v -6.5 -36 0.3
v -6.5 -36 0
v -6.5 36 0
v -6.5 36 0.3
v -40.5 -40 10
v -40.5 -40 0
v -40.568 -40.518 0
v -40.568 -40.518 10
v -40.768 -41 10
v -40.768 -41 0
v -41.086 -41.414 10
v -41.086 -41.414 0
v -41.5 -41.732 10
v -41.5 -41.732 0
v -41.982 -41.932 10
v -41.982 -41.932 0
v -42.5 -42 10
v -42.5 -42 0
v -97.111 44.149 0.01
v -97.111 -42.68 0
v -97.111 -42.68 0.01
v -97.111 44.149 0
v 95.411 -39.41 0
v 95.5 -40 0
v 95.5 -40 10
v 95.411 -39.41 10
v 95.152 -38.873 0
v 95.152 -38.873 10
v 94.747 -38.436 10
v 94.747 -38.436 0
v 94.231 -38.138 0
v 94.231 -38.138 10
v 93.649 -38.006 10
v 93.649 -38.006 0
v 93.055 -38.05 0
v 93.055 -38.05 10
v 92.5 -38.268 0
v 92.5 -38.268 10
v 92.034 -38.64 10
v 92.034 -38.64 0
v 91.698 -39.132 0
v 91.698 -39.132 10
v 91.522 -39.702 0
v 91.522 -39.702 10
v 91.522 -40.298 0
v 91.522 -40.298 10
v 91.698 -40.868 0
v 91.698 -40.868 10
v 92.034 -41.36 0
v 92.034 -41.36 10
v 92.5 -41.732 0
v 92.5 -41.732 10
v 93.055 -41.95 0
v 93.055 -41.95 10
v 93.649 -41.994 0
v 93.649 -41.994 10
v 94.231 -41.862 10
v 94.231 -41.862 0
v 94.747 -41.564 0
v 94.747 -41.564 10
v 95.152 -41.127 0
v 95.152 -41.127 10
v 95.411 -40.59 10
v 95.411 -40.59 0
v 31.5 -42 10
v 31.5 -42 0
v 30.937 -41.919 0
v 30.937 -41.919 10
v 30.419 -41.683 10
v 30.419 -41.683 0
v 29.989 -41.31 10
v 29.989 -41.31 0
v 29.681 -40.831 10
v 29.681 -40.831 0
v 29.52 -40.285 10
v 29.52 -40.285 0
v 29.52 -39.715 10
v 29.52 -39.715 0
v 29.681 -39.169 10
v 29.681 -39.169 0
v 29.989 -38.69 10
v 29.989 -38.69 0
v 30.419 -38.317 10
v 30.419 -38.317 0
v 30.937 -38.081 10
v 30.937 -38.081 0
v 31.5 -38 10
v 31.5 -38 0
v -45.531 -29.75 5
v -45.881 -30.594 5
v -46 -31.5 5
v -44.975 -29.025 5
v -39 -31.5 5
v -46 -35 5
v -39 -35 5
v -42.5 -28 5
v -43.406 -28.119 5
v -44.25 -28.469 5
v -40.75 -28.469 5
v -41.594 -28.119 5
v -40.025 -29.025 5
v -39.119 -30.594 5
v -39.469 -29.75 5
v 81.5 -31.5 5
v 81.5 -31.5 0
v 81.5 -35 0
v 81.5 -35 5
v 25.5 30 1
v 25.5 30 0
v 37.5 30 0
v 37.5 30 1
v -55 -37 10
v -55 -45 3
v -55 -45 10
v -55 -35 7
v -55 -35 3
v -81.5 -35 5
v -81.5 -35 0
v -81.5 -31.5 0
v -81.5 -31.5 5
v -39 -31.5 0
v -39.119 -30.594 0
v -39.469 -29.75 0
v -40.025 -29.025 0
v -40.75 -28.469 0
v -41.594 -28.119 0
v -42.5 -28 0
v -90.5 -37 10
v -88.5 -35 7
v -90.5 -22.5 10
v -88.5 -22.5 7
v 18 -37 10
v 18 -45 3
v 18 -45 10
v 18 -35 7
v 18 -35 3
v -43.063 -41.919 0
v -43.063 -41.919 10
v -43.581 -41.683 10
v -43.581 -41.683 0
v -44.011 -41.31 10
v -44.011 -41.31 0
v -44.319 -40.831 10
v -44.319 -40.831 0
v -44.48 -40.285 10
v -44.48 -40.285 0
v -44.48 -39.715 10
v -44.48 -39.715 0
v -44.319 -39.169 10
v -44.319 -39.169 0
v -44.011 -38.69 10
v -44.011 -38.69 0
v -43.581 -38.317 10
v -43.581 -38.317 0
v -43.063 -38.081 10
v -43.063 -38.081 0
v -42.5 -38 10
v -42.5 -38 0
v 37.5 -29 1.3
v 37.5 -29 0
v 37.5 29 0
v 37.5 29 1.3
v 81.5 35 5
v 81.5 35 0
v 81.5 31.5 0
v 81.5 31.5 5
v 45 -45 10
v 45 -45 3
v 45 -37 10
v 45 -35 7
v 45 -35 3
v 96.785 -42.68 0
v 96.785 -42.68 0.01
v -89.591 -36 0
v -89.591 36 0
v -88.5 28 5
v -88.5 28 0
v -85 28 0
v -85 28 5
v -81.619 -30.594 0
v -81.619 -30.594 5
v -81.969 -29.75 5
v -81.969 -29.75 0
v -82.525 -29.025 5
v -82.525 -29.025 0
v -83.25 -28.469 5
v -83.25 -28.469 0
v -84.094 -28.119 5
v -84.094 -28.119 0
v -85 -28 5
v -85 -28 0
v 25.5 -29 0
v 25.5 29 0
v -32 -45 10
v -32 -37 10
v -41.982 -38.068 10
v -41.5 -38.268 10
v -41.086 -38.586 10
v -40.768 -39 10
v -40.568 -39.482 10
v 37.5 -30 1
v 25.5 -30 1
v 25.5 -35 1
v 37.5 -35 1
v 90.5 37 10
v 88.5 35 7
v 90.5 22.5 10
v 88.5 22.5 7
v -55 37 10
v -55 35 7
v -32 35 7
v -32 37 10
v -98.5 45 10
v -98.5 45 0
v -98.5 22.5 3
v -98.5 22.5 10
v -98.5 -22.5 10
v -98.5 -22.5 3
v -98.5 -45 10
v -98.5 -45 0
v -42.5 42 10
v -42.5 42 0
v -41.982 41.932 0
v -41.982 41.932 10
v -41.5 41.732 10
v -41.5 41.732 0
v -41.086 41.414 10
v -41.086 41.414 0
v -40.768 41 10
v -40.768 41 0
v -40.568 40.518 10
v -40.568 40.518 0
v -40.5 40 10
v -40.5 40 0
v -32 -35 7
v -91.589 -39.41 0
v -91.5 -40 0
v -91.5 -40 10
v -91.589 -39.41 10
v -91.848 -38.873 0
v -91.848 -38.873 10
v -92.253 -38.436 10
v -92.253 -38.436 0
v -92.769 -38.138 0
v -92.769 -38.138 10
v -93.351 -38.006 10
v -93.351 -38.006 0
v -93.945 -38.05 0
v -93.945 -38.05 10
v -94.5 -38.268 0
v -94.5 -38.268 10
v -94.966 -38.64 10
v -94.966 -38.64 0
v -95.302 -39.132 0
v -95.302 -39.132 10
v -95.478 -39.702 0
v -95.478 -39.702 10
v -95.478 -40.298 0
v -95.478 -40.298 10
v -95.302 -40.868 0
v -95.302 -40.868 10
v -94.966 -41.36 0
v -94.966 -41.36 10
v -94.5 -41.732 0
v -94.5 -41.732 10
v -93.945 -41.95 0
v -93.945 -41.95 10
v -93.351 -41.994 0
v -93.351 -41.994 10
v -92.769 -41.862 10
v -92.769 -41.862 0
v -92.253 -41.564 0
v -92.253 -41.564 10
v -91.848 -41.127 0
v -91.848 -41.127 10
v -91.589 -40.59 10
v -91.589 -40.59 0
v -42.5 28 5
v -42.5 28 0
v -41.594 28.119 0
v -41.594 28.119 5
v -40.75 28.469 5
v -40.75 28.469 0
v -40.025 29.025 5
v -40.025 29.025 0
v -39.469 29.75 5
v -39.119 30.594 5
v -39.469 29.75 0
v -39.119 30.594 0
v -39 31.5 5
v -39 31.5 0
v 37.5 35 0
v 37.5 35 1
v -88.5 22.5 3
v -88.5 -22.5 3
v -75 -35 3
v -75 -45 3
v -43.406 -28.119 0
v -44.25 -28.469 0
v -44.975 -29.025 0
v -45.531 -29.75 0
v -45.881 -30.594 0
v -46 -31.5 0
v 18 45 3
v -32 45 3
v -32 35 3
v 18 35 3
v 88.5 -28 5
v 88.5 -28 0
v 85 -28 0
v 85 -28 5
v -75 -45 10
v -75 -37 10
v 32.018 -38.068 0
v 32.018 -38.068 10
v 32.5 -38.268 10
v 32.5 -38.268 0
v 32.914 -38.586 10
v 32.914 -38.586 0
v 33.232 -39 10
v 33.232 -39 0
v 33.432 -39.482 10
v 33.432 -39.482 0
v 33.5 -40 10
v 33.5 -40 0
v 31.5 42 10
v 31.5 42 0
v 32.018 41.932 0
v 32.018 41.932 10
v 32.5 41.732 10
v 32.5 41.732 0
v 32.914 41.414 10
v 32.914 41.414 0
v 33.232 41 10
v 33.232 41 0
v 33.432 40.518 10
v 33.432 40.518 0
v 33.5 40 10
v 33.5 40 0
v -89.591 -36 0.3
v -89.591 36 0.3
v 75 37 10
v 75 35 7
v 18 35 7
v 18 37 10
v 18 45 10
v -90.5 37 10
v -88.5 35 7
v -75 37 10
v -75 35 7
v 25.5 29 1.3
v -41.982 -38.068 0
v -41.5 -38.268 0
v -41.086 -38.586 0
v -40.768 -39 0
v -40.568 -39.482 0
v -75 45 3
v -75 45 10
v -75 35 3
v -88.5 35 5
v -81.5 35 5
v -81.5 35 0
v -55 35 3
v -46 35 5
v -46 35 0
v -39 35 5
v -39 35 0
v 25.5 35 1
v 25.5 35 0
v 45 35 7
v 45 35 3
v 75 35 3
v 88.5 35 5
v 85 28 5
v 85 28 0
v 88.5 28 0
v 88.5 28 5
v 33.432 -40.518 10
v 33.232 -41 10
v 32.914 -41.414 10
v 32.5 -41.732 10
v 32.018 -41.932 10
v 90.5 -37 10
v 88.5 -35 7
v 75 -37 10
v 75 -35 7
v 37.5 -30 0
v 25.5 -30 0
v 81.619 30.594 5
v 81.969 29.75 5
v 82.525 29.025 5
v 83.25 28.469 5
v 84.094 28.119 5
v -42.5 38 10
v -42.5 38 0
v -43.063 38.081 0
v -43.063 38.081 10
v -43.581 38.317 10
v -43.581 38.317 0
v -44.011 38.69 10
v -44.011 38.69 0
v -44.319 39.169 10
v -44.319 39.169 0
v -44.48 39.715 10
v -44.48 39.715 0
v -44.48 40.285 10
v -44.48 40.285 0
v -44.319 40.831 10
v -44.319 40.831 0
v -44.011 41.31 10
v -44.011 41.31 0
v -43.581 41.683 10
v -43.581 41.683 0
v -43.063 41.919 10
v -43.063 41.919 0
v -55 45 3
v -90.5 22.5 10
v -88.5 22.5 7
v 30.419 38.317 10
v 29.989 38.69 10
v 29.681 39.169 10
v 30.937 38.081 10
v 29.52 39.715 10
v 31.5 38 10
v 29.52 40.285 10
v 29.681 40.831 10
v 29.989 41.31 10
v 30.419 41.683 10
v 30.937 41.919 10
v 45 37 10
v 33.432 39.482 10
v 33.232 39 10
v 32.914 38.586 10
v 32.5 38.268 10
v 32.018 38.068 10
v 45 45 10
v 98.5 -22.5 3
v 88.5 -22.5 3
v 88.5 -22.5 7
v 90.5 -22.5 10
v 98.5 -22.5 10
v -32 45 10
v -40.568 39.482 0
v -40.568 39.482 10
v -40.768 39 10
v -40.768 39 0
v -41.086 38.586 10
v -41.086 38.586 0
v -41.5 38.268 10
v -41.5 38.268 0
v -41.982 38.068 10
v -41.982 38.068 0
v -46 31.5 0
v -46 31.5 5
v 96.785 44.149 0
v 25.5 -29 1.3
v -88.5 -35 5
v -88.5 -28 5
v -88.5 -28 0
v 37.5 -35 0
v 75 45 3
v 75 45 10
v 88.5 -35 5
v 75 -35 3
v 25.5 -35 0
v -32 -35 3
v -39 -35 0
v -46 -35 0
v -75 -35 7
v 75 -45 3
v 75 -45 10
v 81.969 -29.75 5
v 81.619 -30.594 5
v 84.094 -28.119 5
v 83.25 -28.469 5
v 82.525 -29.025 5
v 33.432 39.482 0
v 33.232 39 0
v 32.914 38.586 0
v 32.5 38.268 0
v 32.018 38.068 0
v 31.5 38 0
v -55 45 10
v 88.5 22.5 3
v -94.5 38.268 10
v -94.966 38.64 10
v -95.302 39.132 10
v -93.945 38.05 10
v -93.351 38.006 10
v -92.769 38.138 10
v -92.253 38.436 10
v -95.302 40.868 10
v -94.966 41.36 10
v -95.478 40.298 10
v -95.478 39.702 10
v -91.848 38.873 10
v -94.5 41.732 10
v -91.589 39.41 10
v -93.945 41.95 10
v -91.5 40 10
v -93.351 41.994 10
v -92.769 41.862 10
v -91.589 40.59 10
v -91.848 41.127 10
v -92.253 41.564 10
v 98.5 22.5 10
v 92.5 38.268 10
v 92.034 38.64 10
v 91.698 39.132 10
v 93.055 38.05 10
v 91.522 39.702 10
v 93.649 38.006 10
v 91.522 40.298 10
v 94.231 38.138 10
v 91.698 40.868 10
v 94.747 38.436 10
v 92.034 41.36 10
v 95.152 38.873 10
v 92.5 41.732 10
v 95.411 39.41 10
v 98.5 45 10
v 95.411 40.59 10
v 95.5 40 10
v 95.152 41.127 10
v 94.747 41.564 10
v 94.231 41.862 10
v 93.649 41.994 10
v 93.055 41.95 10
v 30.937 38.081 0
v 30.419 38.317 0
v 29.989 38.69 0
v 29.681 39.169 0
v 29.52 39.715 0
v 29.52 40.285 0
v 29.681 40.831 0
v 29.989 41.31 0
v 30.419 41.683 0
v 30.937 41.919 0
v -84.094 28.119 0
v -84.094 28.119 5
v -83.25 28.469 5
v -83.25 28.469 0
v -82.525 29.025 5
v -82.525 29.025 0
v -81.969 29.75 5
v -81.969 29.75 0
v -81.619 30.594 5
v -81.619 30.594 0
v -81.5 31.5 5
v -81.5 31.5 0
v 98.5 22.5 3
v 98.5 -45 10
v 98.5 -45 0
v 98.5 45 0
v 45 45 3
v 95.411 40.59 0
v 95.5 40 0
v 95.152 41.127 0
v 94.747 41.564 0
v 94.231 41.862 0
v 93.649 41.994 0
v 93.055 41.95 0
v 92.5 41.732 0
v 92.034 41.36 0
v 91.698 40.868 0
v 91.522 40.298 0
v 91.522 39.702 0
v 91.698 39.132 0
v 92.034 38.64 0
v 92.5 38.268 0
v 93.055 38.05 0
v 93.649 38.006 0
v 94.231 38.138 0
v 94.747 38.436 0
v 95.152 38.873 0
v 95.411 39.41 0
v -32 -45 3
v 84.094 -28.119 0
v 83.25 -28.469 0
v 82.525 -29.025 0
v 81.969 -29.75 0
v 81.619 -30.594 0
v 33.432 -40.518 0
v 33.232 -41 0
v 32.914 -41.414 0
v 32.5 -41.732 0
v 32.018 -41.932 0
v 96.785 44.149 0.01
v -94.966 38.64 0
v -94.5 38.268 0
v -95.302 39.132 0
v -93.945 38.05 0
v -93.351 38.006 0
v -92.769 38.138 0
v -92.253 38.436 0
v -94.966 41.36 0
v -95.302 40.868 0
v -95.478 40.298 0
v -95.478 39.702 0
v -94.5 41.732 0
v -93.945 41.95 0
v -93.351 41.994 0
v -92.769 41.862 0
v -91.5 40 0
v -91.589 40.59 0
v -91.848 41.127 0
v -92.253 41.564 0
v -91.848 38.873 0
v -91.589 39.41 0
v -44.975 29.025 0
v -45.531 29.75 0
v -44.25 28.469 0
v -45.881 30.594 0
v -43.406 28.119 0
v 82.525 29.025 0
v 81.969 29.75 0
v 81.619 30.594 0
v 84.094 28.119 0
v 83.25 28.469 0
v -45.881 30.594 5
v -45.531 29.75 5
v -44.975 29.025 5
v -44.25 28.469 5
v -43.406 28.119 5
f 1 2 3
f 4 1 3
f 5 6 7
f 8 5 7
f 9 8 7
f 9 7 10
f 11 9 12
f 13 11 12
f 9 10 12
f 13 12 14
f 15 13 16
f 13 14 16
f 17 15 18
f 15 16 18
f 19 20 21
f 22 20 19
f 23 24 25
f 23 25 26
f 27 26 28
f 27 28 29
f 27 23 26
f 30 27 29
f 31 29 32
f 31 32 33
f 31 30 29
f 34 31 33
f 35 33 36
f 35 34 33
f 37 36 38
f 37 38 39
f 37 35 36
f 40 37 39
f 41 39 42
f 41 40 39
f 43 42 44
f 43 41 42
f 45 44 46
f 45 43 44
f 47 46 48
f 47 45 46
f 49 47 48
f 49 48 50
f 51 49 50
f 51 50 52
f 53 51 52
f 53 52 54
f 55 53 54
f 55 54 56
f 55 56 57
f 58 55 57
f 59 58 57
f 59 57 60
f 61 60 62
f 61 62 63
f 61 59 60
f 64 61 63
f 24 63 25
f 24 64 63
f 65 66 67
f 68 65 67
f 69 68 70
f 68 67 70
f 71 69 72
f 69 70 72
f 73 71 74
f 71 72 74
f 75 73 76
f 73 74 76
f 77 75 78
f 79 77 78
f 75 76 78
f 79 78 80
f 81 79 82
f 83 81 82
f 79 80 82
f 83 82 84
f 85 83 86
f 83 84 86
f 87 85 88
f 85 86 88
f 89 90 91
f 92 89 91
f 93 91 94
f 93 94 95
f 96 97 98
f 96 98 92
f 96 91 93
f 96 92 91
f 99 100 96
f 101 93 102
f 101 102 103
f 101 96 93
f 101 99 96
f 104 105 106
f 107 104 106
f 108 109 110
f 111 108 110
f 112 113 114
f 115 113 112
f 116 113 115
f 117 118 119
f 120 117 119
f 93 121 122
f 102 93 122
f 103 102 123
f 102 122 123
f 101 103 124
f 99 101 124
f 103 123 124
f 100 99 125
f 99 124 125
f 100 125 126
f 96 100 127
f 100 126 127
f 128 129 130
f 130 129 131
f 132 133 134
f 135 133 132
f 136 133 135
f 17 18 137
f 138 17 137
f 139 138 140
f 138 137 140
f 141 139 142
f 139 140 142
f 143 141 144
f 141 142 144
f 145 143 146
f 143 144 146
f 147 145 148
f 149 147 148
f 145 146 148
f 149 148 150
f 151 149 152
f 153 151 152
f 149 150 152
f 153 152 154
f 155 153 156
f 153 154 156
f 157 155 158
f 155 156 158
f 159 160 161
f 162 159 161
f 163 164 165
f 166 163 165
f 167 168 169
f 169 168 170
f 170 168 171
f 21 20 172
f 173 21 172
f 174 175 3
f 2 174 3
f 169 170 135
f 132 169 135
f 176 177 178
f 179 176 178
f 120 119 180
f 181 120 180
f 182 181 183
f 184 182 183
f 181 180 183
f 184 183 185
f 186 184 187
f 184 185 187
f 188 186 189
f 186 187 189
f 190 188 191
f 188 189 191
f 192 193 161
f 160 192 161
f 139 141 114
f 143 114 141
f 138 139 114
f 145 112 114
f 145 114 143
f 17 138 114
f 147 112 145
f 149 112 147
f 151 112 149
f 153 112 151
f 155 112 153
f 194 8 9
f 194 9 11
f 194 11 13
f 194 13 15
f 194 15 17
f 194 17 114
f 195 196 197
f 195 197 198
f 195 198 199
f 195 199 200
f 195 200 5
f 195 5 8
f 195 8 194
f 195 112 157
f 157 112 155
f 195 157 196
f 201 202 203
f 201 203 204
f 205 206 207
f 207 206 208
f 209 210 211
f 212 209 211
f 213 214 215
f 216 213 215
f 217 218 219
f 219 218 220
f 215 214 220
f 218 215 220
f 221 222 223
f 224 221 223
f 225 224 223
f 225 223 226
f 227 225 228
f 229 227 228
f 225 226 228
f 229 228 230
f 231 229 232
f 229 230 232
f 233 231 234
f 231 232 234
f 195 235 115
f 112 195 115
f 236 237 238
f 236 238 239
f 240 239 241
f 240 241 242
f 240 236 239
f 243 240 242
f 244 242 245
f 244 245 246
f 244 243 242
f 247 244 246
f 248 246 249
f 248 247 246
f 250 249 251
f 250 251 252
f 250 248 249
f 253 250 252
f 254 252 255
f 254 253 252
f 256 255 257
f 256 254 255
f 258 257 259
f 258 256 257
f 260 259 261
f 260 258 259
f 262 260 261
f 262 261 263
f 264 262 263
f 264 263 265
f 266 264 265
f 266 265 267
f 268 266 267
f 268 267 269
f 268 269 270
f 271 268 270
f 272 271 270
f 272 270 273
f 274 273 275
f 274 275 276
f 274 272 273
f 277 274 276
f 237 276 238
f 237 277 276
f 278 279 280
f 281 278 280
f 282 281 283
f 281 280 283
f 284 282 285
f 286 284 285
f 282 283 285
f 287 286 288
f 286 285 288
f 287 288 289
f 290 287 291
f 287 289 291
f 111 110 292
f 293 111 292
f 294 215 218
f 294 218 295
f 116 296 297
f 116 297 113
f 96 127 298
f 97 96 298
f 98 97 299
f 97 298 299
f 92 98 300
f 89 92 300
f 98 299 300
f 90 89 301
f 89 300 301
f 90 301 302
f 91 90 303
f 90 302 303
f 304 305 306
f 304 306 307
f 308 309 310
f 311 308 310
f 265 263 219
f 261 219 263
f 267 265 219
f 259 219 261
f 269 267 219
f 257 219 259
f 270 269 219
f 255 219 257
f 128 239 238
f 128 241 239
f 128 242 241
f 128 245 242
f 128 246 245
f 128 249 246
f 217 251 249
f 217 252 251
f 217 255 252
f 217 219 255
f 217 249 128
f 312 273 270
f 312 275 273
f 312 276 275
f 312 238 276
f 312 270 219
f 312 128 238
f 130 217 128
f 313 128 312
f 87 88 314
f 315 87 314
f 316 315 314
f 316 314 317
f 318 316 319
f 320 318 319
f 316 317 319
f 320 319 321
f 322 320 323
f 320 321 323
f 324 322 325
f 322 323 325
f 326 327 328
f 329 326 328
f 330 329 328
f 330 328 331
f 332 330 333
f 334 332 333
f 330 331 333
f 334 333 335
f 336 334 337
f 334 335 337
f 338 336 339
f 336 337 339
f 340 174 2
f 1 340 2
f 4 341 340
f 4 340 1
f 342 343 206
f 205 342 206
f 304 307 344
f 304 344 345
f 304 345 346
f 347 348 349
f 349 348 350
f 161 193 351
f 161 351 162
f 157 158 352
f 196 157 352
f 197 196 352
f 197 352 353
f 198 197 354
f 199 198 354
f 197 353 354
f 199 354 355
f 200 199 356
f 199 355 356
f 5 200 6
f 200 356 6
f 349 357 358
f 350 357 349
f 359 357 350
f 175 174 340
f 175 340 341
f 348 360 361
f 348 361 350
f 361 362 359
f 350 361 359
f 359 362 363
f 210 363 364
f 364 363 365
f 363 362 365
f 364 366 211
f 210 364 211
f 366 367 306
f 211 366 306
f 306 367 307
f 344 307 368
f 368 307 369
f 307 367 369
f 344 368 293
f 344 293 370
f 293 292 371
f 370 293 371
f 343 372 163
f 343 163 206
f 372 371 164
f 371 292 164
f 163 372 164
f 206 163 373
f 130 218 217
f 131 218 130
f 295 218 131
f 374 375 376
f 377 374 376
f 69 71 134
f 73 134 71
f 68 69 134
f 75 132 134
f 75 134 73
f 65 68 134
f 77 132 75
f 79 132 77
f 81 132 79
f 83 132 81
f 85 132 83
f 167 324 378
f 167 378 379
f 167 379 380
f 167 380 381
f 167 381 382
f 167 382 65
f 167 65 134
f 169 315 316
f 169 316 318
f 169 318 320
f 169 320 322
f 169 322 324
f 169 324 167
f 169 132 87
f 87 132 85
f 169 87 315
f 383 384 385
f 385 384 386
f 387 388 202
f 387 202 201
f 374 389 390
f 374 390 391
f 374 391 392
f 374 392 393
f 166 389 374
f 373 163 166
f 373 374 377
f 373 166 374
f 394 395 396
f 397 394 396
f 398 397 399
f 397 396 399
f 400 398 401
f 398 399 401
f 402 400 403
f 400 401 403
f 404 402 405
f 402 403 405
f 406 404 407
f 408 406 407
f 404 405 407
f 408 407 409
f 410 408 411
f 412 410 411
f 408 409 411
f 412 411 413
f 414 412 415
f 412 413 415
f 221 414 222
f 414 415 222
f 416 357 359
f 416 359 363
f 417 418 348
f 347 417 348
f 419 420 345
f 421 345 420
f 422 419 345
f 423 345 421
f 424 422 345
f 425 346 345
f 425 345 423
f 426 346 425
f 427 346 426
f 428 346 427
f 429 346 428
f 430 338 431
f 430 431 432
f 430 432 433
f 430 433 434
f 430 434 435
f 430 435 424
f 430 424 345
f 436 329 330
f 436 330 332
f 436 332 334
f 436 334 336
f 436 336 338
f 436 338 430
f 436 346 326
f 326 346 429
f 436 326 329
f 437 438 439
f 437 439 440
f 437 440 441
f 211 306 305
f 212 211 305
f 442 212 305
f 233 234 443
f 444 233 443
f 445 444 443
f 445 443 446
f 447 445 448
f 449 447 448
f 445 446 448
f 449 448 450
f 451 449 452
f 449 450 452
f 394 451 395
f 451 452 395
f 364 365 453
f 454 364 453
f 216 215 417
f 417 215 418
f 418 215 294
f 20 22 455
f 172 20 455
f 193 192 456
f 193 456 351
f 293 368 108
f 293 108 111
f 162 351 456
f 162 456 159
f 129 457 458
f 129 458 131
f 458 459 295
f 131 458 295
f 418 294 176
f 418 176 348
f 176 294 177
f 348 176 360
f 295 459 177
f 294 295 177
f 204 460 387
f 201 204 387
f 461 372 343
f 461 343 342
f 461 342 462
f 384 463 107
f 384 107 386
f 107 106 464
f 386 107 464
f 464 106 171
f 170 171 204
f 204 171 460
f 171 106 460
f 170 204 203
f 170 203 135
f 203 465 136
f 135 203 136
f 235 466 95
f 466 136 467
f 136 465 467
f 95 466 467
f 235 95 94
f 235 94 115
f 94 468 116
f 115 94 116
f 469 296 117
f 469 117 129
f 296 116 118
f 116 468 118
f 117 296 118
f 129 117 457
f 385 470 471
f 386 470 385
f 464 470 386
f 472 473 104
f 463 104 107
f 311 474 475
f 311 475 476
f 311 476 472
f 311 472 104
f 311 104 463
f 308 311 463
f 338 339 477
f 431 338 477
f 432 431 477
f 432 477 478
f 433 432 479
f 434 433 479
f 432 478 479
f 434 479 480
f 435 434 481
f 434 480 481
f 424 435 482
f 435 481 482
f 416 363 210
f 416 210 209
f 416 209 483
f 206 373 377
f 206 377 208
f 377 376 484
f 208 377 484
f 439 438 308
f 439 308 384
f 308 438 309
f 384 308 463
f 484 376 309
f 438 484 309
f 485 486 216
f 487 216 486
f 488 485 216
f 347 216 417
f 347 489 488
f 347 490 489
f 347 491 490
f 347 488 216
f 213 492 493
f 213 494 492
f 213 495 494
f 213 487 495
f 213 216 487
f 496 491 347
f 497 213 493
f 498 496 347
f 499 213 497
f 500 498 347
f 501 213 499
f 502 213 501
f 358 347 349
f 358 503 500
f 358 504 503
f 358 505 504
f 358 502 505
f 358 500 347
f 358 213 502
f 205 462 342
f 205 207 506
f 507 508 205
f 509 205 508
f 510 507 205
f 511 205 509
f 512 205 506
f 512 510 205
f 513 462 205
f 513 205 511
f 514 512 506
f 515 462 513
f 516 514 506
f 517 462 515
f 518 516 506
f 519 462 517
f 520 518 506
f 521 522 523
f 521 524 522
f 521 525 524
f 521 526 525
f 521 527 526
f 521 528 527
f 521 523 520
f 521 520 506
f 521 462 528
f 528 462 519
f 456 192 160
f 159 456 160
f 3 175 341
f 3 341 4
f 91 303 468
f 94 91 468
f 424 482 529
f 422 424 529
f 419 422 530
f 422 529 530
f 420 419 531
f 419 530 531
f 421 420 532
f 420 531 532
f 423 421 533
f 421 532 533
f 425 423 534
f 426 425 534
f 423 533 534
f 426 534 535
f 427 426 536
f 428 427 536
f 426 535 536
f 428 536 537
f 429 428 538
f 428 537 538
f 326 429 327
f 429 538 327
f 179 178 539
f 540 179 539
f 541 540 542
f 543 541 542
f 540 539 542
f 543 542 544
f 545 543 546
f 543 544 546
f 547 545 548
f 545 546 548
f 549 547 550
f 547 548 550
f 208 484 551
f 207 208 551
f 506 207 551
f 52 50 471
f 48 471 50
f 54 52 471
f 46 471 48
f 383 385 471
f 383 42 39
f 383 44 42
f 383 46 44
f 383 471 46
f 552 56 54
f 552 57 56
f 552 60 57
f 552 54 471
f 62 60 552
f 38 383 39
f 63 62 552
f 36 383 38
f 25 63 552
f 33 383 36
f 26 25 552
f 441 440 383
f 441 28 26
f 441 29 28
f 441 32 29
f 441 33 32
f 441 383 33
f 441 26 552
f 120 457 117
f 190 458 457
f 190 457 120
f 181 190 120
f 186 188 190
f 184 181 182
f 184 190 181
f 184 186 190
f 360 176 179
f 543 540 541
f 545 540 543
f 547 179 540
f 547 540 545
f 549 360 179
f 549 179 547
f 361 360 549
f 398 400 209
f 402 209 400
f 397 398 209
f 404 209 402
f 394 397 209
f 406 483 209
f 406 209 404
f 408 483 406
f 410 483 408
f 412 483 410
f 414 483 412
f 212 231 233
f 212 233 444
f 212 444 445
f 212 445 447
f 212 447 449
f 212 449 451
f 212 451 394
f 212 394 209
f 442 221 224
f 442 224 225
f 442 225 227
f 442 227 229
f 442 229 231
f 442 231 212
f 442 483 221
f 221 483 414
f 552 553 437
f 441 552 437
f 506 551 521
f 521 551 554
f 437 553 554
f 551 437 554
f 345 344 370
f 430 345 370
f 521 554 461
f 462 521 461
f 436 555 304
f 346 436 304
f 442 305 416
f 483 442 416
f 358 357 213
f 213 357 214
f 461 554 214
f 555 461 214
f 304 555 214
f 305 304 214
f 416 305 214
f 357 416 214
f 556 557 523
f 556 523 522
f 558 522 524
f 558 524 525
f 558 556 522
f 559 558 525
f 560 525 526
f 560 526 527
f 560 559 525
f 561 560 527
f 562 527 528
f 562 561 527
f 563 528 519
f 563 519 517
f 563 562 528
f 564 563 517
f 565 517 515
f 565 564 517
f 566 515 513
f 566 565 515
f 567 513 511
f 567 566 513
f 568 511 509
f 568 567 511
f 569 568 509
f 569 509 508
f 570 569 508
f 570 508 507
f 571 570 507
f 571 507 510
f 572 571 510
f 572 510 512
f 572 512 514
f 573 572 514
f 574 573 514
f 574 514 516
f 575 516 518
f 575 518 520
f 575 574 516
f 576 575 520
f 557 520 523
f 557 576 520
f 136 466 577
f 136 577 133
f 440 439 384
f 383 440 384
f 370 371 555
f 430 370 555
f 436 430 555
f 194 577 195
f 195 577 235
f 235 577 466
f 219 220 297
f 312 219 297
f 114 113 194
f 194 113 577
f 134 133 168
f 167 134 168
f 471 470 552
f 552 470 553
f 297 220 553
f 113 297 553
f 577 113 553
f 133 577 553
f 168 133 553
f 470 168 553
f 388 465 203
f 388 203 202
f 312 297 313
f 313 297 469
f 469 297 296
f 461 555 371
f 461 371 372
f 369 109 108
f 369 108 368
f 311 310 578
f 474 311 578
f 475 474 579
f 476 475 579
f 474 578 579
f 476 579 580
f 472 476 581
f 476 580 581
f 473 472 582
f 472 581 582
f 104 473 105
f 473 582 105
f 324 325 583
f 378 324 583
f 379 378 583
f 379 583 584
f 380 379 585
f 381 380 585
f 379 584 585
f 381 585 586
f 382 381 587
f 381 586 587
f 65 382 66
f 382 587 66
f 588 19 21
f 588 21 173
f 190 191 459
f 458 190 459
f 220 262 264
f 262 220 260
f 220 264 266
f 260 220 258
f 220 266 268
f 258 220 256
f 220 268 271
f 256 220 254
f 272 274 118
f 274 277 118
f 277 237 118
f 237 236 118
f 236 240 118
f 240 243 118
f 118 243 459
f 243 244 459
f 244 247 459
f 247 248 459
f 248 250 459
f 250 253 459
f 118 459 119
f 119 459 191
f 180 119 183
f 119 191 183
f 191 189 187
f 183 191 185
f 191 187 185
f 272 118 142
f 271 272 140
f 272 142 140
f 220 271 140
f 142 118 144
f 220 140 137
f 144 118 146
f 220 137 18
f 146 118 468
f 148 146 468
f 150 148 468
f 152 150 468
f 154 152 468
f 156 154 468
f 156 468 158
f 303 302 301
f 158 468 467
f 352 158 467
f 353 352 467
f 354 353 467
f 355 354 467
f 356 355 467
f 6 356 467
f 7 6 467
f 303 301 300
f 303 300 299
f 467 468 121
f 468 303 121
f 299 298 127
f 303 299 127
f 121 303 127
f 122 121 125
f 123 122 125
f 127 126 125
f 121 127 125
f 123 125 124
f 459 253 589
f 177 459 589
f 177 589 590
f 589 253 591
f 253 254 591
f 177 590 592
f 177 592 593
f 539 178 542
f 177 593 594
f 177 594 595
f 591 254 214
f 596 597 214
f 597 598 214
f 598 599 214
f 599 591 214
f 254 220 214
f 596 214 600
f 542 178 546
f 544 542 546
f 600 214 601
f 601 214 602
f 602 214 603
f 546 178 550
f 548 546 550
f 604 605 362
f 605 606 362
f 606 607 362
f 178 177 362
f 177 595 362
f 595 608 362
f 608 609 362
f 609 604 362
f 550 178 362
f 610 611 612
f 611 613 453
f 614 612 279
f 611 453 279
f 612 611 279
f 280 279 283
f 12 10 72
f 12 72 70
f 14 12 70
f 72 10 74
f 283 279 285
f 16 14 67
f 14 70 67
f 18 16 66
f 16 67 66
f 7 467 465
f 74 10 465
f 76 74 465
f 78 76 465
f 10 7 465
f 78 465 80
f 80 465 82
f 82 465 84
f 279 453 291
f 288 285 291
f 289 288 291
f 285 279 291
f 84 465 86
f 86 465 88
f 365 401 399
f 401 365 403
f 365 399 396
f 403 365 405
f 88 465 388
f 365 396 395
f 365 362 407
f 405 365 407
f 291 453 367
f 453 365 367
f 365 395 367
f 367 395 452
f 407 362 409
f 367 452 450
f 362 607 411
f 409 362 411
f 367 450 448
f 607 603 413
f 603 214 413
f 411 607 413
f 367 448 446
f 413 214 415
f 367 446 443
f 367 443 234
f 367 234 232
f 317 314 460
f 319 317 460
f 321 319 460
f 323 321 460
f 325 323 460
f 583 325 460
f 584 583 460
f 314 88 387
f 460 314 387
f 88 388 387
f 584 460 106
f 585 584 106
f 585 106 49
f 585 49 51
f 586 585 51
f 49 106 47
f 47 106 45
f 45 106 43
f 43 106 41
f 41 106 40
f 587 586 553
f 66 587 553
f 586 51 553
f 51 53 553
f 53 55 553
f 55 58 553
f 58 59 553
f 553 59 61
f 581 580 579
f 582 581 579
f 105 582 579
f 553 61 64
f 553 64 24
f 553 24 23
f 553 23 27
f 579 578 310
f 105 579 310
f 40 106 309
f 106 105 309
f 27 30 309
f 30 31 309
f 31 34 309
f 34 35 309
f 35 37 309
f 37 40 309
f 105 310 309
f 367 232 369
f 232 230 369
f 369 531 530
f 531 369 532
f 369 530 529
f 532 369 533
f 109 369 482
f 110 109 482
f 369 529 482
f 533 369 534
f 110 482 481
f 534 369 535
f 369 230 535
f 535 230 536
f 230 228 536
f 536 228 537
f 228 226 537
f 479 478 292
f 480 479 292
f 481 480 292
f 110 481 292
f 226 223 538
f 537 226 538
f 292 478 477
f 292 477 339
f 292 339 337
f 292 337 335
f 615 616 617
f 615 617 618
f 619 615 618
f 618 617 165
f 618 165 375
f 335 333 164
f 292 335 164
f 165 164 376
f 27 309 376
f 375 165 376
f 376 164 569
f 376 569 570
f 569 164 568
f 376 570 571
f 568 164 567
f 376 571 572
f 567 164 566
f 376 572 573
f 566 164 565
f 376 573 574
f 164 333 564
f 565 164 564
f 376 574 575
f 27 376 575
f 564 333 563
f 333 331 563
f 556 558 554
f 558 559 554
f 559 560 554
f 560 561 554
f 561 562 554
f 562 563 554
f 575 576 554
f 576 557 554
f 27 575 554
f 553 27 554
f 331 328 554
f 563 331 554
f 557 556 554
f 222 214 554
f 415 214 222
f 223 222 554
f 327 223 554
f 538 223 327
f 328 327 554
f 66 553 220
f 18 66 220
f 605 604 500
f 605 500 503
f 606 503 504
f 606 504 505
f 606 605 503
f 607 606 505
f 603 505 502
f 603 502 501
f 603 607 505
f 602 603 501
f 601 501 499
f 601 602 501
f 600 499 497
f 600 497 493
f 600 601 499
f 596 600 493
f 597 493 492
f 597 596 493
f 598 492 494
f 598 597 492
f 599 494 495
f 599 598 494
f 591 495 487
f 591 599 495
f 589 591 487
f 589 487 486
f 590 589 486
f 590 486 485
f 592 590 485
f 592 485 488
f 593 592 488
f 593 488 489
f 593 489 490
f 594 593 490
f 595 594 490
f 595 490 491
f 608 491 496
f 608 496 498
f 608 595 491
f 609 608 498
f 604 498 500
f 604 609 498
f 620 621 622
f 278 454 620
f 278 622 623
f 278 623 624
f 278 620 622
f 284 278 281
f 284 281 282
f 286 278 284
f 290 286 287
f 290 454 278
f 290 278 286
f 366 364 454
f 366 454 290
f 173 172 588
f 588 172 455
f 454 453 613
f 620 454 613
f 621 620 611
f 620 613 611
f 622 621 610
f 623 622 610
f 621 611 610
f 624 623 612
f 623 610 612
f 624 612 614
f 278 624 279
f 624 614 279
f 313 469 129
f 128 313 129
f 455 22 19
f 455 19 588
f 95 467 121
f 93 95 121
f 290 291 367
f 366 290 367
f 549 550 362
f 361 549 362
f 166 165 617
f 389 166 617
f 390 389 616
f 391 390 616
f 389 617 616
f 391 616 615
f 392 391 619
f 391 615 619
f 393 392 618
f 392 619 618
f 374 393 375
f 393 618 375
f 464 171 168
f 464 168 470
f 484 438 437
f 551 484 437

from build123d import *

# Parameters (mm, degrees)
F0_R      = 2
F1_DEPTH  = 10
F2_DEPTH  = 5
F3_SIZE2  = 3
F3_SIZE   = 2
F4_W      = 12
F4_H      = 58
F5_DEPTH  = 1.3
F7_START  = 3
F6_W      = 20
F6_H      = 30.5141843065
F6_H_2    = 45
F6_W_2    = 38.4006889146
F6_W_3    = 23
F6_H_3    = 26.5430039666
F6_W_4    = 50
F6_H_4    = 30.9126630588
F6_W_5    = 27
F6_W_6    = 30
F6_H_5    = 30.5863746506
F6_H_6    = 27.8634131846
F6_W_7    = 32.0585550834
F7_DEPTH  = 22
F8_W      = 12
F8_H      = 5
F9_DEPTH  = 1
F10_W     = 83.0906813658
F10_H     = 72
F11_DEPTH = 0.3
F12_W     = 193.8963830471
F12_H     = 86.8290178478
F13_DEPTH = 0.01


with BuildPart() as f1:
    # F0 (on Top) → F1 (new body)
    with BuildSketch(Plane.XY):
        with BuildLine():
            Line((-81.5, -35), (-88.5, -35))
            Line((-88.5, -35), (-88.5, -28))
            Line((-88.5, -28), (-88.5, 28))
            Line((-88.5, 28), (-88.5, 35))
            Line((-88.5, 35), (-81.5, 35))
            Line((-81.5, 35), (-46, 35))
            Line((-46, 35), (-42.5, 35))
            Line((-42.5, 35), (-42.5, 38))
            ThreePointArc((-42.5, 38), (-44.5, 40), (-42.5, 42))
            Line((-42.5, 42), (-42.5, 45))
            Line((-42.5, 45), (-98.5, 45))
            Line((-98.5, 45), (-98.5, -45))
            Line((-98.5, -45), (-42.5, -45))
            Line((-42.5, -45), (-42.5, -42))
            ThreePointArc((-42.5, -42), (-44.5, -40), (-42.5, -38))
            Line((-42.5, -38), (-42.5, -35))
            Line((-42.5, -35), (-46, -35))
            Line((-46, -35), (-81.5, -35))
        make_face()
        with Locations((-93.5, -40)):
            Circle(F0_R, mode=Mode.SUBTRACT)
        with Locations((-93.5, 40)):
            Circle(F0_R, mode=Mode.SUBTRACT)
        with BuildLine():
            Line((81.5, -35), (31.5, -35))
            Line((31.5, -35), (31.5, -38))
            ThreePointArc((31.5, -38), (32.9142135624, -38.5857864376), (33.5, -40))
            ThreePointArc((33.5, -40), (32.9142135624, -41.4142135624), (31.5, -42))
            Line((31.5, -42), (31.5, -45))
            Line((31.5, -45), (98.5, -45))
            Line((98.5, -45), (98.5, 45))
            Line((98.5, 45), (31.5, 45))
            Line((31.5, 45), (31.5, 42))
            ThreePointArc((31.5, 42), (32.9142135624, 41.4142135624), (33.5, 40))
            ThreePointArc((33.5, 40), (32.9142135624, 38.5857864376), (31.5, 38))
            Line((31.5, 38), (31.5, 35))
            Line((31.5, 35), (81.5, 35))
            Line((81.5, 35), (88.5, 35))
            Line((88.5, 35), (88.5, 28))
            Line((88.5, 28), (88.5, -28))
            Line((88.5, -28), (88.5, -35))
            Line((88.5, -35), (81.5, -35))
        make_face()
        with Locations((93.5, -40)):
            Circle(F0_R, mode=Mode.SUBTRACT)
        with Locations((93.5, 40)):
            Circle(F0_R, mode=Mode.SUBTRACT)
        with BuildLine():
            Line((-39, 35), (31.5, 35))
            Line((31.5, 35), (31.5, 38))
            ThreePointArc((31.5, 38), (29.5, 40), (31.5, 42))
            Line((31.5, 42), (31.5, 45))
            Line((31.5, 45), (-42.5, 45))
            Line((-42.5, 45), (-42.5, 42))
            ThreePointArc((-42.5, 42), (-41.0857864376, 41.4142135624), (-40.5, 40))
            ThreePointArc((-40.5, 40), (-41.0857864376, 38.5857864376), (-42.5, 38))
            Line((-42.5, 38), (-42.5, 35))
            Line((-42.5, 35), (-39, 35))
        make_face()
        with BuildLine():
            Line((-39, -35), (-42.5, -35))
            Line((-42.5, -35), (-42.5, -38))
            ThreePointArc((-42.5, -38), (-41.0857864376, -38.5857864376), (-40.5, -40))
            ThreePointArc((-40.5, -40), (-41.0857864376, -41.4142135624), (-42.5, -42))
            Line((-42.5, -42), (-42.5, -45))
            Line((-42.5, -45), (31.5, -45))
            Line((31.5, -45), (31.5, -42))
            ThreePointArc((31.5, -42), (29.5, -40), (31.5, -38))
            Line((31.5, -38), (31.5, -35))
            Line((31.5, -35), (-39, -35))
        make_face()
    extrude(amount=F1_DEPTH)

    # F0 (on Top) → F2 (join)
    with BuildSketch(Plane.XY):
        with BuildLine():
            Line((-88.5, -28), (-88.5, -35))
            Line((-88.5, -35), (-81.5, -35))
            Line((-81.5, -35), (-81.5, -31.5))
            ThreePointArc((-81.5, -31.5), (-82.5251262658, -29.0251262658), (-85, -28))
            Line((-85, -28), (-88.5, -28))
        make_face()
        with BuildLine():
            Line((-46, -31.5), (-46, -35))
            Line((-46, -35), (-42.5, -35))
            ThreePointArc((-42.5, -35), (-44.9748737342, -33.9748737342), (-46, -31.5))
        make_face()
        with BuildLine():
            ThreePointArc((-39, -31.5), (-40.0251262658, -33.9748737342), (-42.5, -35))
            Line((-42.5, -35), (-39, -35))
            Line((-39, -35), (-39, -31.5))
        make_face()
        with BuildLine():
            ThreePointArc((-46, -31.5), (-44.9748737342, -33.9748737342), (-42.5, -35))
            Line((-42.5, -35), (-42.5, -28))
            ThreePointArc((-42.5, -28), (-44.9748737342, -29.0251262658), (-46, -31.5))
        make_face()
        with BuildLine():
            Line((-42.5, -28), (-42.5, -35))
            ThreePointArc((-42.5, -35), (-40.0251262658, -33.9748737342), (-39, -31.5))
            ThreePointArc((-39, -31.5), (-40.0251262658, -29.0251262658), (-42.5, -28))
        make_face()
        with BuildLine():
            Line((-88.5, 35), (-88.5, 28))
            Line((-88.5, 28), (-85, 28))
            ThreePointArc((-85, 28), (-82.5251262658, 29.0251262658), (-81.5, 31.5))
            Line((-81.5, 31.5), (-81.5, 35))
            Line((-81.5, 35), (-88.5, 35))
        make_face()
        with BuildLine():
            Line((-42.5, 35), (-42.5, 28))
            ThreePointArc((-42.5, 28), (-40.0251262658, 29.0251262658), (-39, 31.5))
            ThreePointArc((-39, 31.5), (-40.0251262658, 33.9748737342), (-42.5, 35))
        make_face()
        with BuildLine():
            Line((-39, 35), (-42.5, 35))
            ThreePointArc((-42.5, 35), (-40.0251262658, 33.9748737342), (-39, 31.5))
            Line((-39, 31.5), (-39, 35))
        make_face()
        with BuildLine():
            Line((-42.5, 35), (-46, 35))
            Line((-46, 35), (-46, 31.5))
            ThreePointArc((-46, 31.5), (-44.9748737342, 33.9748737342), (-42.5, 35))
        make_face()
        with BuildLine():
            ThreePointArc((-46, 31.5), (-44.9748737342, 29.0251262658), (-42.5, 28))
            Line((-42.5, 28), (-42.5, 35))
            ThreePointArc((-42.5, 35), (-44.9748737342, 33.9748737342), (-46, 31.5))
        make_face()
        with BuildLine():
            Line((81.5, -31.5), (81.5, -35))
            Line((81.5, -35), (88.5, -35))
            Line((88.5, -35), (88.5, -28))
            Line((88.5, -28), (85, -28))
            ThreePointArc((85, -28), (82.5251262658, -29.0251262658), (81.5, -31.5))
        make_face()
        with BuildLine():
            Line((88.5, 35), (81.5, 35))
            Line((81.5, 35), (81.5, 31.5))
            ThreePointArc((81.5, 31.5), (82.5251262658, 29.0251262658), (85, 28))
            Line((85, 28), (88.5, 28))
            Line((88.5, 28), (88.5, 35))
        make_face()
    extrude(amount=F2_DEPTH)

    # F3
    f3_edges = [f1.edges().sort_by_distance(p)[0] for p in [
        (-88.5, 0, 10),
        (0, -35, 10),
        (88.5, 0, 10),
        (0, 35, 10),
    ]]
    f3_side = f1.faces().sort_by_distance((-90.665849, 0, 10))[0]
    chamfer(f3_edges, length=F3_SIZE, length2=F3_SIZE2, reference=f3_side)

    # F6 (on Top) → F7 (cut)
    with BuildSketch(Plane.XY.offset(F7_START)):
        with Locations((-65, 37.7570921533)):
            Rectangle(F6_W, F6_H)
        with Locations((-65, 0)):
            Rectangle(F6_W, F6_H_2)
        with Locations((-94.2003444573, 0)):
            Rectangle(F6_W_2, F6_H_2)
        with Locations((-43.5, 0)):
            Rectangle(F6_W_3, F6_H_2)
        with Locations((-65, -35.7715019833)):
            Rectangle(F6_W, F6_H_3)
        with Locations((-7, 0)):
            Rectangle(F6_W_4, F6_H_2)
        with Locations((-7, 37.9563315294)):
            Rectangle(F6_W_4, F6_H_4)
        with Locations((-7, -35.7715019833)):
            Rectangle(F6_W_4, F6_H_3)
        with Locations((31.5, 0)):
            Rectangle(F6_W_5, F6_H_2)
        with Locations((60, 0)):
            Rectangle(F6_W_6, F6_H_2)
        with Locations((60, 37.7931873253)):
            Rectangle(F6_W_6, F6_H_5)
        with Locations((60, -36.4317065923)):
            Rectangle(F6_W_6, F6_H_6)
        with Locations((91.0292775417, 0)):
            Rectangle(F6_W_7, F6_H_2)
    extrude(amount=F7_DEPTH, mode=Mode.SUBTRACT)

    # F8 (on Top) → F9 (join)
    with BuildSketch(Plane.XY):
        with Locations((31.5, 32.5)):
            Rectangle(F8_W, F8_H)
        with Locations((31.5, -32.5)):
            Rectangle(F8_W, F8_H)
    extrude(amount=F9_DEPTH)


with BuildPart() as f5:
    # F4 (on Top) → F5 (new body)
    with BuildSketch(Plane.XY):
        with Locations((31.5, 0)):
            Rectangle(F4_W, F4_H)
    extrude(amount=F5_DEPTH)


with BuildPart() as f11:
    # F10 (on Top) → F11 (new body)
    with BuildSketch(Plane.XY):
        with Locations((-48.0453406829, 0)):
            Rectangle(F10_W, F10_H)
    extrude(amount=F11_DEPTH)


with BuildPart() as f13:
    # F12 (on Top) → F13 (new body)
    with BuildSketch(Plane.XY):
        with Locations((-0.1632124186, 0.7344540209)):
            Rectangle(F12_W, F12_H)
    extrude(amount=F13_DEPTH)


solid = Compound([f1.part, f5.part, f11.part, f13.part])
